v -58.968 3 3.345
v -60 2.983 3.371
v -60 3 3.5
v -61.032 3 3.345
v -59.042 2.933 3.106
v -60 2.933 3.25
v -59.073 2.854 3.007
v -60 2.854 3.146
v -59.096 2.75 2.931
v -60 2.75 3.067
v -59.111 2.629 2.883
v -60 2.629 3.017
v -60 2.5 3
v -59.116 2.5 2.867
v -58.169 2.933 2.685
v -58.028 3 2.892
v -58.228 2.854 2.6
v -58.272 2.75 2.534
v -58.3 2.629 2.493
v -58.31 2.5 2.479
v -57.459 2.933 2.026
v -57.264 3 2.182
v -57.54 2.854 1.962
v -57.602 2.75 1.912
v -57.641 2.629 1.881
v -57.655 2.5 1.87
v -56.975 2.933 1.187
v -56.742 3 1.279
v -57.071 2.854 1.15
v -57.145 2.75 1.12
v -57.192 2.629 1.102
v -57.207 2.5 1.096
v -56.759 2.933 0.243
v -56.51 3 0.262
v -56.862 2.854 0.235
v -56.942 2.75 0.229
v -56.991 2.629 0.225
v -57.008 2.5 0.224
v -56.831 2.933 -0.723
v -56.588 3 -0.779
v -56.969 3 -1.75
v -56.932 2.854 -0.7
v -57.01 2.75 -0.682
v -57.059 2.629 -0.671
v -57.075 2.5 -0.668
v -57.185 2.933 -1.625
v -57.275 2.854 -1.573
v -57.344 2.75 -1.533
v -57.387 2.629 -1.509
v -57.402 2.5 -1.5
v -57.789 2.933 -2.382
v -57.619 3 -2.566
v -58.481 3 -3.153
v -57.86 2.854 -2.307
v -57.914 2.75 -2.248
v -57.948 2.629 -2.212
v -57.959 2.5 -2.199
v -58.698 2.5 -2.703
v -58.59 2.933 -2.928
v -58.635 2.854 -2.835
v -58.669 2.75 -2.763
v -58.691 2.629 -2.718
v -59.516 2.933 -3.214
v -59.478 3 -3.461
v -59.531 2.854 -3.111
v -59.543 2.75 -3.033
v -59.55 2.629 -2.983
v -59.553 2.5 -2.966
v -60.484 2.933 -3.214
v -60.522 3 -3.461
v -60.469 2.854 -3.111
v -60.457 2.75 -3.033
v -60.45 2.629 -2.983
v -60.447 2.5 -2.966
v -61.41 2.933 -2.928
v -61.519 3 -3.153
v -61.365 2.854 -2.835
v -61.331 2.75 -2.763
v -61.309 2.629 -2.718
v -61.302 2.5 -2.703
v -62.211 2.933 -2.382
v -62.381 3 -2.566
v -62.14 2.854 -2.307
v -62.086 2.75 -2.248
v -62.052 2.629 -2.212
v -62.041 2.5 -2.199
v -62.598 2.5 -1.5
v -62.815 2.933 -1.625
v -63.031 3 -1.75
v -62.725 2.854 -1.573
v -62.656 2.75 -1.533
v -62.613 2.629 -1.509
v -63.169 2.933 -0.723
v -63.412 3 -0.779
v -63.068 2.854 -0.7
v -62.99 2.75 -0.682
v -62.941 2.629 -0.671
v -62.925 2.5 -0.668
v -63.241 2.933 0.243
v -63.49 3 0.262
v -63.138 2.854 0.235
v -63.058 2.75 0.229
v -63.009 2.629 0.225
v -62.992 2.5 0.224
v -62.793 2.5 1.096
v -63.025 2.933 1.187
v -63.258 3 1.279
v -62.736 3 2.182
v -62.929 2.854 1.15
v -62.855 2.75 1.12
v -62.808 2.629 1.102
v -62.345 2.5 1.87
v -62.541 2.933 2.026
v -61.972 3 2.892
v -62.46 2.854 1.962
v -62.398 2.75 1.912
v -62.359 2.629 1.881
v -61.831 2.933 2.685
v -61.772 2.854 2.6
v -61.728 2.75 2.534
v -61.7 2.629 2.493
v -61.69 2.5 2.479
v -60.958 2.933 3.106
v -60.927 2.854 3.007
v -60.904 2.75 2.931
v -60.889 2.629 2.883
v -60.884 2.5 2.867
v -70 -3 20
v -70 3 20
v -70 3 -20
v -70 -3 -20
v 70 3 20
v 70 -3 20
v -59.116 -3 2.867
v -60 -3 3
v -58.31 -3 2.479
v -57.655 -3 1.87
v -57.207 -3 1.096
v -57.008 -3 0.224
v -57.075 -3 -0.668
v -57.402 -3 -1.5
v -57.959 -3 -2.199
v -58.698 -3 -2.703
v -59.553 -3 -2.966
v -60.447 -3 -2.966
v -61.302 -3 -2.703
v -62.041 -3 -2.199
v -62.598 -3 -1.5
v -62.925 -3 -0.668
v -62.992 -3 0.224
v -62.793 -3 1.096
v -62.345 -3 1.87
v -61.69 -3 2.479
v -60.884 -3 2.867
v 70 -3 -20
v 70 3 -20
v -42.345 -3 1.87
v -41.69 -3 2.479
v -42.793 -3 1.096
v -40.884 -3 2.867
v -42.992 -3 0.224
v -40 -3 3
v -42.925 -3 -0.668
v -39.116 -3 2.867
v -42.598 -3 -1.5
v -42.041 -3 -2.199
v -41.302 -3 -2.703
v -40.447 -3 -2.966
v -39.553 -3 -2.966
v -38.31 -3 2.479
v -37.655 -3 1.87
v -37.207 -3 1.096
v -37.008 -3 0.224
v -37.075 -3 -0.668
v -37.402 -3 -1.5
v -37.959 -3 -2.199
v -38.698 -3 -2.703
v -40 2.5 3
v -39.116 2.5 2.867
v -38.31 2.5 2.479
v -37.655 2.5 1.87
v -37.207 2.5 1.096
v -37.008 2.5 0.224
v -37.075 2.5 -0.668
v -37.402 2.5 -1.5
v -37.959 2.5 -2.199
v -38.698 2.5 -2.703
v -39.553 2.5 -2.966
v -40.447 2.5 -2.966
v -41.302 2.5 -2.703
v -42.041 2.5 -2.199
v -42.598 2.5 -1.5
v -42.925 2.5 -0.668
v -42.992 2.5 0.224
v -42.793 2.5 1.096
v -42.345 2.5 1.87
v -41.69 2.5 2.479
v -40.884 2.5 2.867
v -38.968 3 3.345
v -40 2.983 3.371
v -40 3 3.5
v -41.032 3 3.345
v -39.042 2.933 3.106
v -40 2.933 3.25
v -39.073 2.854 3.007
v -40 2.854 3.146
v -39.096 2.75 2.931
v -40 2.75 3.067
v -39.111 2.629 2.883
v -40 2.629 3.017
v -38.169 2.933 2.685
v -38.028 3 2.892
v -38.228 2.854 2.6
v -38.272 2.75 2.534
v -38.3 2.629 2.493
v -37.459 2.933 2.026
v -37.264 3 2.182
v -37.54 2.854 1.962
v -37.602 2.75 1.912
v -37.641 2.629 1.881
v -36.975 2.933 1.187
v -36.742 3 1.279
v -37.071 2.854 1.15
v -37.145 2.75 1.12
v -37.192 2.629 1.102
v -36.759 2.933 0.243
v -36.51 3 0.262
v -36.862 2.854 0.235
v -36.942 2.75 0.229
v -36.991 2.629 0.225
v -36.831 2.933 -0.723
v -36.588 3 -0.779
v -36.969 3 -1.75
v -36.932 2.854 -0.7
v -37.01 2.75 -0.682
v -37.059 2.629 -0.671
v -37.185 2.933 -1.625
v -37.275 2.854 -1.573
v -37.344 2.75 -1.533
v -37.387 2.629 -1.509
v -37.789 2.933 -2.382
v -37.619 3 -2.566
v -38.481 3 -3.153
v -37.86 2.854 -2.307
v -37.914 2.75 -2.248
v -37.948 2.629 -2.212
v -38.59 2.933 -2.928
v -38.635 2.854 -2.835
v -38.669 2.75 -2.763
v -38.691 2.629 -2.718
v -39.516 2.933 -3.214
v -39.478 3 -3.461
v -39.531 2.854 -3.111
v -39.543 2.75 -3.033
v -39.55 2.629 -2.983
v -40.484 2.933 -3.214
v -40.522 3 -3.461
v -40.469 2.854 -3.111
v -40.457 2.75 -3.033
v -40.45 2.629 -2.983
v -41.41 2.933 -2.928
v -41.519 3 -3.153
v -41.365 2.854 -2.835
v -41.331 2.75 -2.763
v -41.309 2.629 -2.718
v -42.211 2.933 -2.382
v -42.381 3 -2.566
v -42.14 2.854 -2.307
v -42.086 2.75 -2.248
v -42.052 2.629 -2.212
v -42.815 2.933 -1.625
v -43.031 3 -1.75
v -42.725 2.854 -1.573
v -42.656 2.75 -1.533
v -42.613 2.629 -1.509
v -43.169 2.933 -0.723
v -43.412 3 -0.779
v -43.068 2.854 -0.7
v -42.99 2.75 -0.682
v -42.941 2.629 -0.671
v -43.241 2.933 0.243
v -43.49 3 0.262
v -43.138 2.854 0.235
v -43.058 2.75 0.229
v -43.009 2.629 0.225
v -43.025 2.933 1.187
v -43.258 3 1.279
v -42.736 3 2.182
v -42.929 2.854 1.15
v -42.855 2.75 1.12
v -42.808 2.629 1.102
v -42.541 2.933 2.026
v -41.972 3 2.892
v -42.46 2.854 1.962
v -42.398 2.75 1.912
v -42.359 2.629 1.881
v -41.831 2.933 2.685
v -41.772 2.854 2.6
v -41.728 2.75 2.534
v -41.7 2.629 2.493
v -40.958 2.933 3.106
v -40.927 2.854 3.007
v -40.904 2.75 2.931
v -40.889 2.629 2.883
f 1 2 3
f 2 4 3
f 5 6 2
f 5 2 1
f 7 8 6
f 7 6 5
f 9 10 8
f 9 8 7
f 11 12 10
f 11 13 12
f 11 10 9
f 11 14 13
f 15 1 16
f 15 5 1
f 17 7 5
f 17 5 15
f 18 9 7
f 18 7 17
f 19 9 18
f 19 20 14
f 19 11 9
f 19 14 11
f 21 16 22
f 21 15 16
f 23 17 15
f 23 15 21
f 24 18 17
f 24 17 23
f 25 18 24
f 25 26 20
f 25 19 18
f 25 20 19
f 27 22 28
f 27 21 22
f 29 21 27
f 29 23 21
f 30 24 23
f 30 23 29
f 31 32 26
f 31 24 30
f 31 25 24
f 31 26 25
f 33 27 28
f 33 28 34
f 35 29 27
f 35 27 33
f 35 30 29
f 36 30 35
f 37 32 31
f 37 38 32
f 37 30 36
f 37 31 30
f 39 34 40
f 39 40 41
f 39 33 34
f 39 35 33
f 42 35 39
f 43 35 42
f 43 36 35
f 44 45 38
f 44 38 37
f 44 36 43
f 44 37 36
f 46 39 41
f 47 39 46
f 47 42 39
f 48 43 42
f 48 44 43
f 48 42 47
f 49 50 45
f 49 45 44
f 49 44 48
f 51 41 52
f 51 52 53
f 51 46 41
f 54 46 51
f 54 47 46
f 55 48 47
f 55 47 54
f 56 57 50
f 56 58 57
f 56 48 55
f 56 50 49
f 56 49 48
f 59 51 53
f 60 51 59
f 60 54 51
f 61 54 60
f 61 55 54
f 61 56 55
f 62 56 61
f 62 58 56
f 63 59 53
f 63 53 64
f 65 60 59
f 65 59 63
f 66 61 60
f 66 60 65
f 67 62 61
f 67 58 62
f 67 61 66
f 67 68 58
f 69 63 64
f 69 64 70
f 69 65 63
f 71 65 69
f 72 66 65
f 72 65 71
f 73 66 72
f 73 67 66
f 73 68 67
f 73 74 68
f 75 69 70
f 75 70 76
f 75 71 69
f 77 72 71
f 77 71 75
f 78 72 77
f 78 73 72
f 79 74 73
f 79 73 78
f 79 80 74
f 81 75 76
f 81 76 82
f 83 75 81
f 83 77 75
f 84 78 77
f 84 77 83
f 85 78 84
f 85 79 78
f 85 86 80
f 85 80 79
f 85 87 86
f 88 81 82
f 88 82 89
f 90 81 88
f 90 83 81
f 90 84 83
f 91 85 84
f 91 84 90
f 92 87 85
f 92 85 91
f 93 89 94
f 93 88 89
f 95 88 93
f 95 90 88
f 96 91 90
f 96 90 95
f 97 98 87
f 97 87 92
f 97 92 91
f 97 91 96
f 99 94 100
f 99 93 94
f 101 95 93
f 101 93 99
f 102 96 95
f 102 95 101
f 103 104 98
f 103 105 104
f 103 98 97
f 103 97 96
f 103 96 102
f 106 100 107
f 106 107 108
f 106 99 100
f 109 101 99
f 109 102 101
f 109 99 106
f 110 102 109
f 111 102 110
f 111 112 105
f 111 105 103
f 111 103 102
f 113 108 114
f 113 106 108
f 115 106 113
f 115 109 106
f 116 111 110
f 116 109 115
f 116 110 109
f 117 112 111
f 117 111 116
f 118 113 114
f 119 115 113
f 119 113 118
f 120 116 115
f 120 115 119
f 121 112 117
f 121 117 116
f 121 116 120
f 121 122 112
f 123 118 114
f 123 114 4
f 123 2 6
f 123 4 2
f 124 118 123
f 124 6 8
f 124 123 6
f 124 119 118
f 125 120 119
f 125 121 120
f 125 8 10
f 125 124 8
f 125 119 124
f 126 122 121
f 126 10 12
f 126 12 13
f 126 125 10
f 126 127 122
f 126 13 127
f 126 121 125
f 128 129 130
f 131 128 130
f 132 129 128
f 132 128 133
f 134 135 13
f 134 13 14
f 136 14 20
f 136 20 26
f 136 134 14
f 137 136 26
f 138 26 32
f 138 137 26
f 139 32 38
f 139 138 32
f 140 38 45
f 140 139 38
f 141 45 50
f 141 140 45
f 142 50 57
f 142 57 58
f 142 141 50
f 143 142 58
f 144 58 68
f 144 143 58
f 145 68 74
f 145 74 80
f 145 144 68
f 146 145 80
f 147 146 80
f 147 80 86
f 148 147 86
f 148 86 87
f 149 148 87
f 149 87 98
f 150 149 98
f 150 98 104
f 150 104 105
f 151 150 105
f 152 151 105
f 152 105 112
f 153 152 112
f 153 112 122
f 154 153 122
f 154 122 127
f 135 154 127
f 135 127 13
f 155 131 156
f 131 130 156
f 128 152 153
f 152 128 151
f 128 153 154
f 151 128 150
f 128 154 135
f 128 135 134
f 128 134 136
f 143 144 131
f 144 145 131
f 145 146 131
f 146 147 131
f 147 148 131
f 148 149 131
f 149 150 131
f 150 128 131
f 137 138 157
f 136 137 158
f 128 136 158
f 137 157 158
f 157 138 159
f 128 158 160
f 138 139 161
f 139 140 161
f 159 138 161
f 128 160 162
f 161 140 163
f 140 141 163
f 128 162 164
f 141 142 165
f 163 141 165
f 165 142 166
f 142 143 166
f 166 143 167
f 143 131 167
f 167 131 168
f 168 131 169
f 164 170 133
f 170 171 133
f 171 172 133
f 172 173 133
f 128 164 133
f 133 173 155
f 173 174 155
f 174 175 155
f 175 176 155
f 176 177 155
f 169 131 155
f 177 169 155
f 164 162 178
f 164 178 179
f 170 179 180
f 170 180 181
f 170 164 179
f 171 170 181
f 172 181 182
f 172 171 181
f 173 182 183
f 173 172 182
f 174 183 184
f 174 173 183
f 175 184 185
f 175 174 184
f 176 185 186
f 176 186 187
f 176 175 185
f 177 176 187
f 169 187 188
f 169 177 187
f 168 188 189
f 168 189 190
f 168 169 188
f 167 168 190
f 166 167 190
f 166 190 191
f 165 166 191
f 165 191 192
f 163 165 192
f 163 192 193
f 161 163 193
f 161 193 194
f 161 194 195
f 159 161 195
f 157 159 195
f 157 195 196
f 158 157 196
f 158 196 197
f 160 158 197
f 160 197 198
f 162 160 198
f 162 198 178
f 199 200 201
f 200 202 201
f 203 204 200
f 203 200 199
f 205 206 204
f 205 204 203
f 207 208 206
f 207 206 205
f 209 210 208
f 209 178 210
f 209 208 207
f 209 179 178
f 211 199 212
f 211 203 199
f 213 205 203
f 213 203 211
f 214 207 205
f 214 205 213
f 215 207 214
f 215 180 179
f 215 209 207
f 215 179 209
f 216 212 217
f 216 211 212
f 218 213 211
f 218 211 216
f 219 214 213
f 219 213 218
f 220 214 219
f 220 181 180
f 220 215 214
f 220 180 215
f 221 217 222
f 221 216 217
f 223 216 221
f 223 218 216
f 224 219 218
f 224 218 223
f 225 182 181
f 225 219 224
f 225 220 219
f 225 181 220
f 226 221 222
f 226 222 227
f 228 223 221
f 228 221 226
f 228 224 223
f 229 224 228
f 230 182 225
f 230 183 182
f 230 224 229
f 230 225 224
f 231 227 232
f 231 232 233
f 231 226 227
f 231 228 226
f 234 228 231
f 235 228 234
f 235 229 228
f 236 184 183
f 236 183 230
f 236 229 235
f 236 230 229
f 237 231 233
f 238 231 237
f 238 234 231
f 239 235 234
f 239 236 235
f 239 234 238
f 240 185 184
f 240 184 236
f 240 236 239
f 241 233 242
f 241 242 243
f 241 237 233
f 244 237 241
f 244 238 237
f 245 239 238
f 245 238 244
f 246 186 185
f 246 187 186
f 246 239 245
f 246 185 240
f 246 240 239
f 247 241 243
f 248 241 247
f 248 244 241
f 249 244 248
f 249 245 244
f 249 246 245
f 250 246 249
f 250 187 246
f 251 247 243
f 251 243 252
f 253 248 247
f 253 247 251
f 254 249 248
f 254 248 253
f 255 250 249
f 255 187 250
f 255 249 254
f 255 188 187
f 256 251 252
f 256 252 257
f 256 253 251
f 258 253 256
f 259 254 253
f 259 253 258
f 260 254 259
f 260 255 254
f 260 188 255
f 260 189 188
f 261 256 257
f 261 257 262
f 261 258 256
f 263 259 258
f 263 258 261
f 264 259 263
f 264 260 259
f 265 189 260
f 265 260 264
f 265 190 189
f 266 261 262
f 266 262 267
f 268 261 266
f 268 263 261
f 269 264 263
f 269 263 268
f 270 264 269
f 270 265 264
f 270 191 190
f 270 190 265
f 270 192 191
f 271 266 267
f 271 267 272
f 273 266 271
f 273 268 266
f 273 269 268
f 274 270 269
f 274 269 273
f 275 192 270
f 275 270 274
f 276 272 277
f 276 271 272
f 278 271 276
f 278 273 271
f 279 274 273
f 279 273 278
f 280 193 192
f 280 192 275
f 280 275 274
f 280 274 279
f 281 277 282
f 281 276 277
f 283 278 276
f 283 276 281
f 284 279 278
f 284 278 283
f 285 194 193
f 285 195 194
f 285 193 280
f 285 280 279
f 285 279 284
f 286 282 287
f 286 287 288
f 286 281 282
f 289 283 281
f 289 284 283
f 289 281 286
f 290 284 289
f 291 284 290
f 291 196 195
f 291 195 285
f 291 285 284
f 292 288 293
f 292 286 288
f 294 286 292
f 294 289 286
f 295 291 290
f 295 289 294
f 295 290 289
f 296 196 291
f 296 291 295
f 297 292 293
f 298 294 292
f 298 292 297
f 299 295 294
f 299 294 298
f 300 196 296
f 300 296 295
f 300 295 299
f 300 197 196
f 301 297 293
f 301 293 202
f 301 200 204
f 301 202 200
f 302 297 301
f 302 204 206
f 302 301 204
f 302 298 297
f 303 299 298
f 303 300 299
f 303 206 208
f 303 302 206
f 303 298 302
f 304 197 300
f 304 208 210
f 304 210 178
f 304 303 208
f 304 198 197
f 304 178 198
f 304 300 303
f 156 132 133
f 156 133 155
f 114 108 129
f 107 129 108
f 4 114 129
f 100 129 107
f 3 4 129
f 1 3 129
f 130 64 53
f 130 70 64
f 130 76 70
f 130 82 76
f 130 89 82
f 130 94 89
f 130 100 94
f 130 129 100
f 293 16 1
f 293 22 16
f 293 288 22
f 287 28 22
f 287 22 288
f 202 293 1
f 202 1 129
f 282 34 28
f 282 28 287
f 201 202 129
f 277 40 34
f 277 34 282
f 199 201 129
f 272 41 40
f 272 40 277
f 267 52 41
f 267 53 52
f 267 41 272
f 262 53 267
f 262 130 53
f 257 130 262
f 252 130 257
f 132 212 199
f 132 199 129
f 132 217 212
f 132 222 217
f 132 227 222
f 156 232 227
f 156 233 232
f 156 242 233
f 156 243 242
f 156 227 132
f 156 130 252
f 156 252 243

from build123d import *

# Parameters (mm, degrees)
SKETCH1_W           = 140
SKETCH1_H           = 40
SKETCH1_R           = 3
BOSS_EXTRUDE1_DEPTH = 3
FILLET1_R           = 0.5


with BuildPart() as part:
    # Sketch1 → Boss-Extrude1 (new, symmetric)
    with BuildSketch(Plane(origin=(0, 0, 0), x_dir=(1, 0, 0), z_dir=(0, 1, 0))):
        Rectangle(SKETCH1_W, SKETCH1_H)
        with Locations(Location((-40, 0, 0), (0, 0, 270))):
            Circle(SKETCH1_R, mode=Mode.SUBTRACT)
        with Locations(Location((-60, 0, 0), (0, 0, 270))):
            Circle(SKETCH1_R, mode=Mode.SUBTRACT)
    extrude(amount=BOSS_EXTRUDE1_DEPTH, both=True)

    # Fillet1
    fillet1_edges = [part.edges().sort_by_distance(p)[0] for p in [
        (-40, 3, -3),
        (-60, 3, -3),
    ]]
    fillet(fillet1_edges, radius=FILLET1_R)


solid = part.part
